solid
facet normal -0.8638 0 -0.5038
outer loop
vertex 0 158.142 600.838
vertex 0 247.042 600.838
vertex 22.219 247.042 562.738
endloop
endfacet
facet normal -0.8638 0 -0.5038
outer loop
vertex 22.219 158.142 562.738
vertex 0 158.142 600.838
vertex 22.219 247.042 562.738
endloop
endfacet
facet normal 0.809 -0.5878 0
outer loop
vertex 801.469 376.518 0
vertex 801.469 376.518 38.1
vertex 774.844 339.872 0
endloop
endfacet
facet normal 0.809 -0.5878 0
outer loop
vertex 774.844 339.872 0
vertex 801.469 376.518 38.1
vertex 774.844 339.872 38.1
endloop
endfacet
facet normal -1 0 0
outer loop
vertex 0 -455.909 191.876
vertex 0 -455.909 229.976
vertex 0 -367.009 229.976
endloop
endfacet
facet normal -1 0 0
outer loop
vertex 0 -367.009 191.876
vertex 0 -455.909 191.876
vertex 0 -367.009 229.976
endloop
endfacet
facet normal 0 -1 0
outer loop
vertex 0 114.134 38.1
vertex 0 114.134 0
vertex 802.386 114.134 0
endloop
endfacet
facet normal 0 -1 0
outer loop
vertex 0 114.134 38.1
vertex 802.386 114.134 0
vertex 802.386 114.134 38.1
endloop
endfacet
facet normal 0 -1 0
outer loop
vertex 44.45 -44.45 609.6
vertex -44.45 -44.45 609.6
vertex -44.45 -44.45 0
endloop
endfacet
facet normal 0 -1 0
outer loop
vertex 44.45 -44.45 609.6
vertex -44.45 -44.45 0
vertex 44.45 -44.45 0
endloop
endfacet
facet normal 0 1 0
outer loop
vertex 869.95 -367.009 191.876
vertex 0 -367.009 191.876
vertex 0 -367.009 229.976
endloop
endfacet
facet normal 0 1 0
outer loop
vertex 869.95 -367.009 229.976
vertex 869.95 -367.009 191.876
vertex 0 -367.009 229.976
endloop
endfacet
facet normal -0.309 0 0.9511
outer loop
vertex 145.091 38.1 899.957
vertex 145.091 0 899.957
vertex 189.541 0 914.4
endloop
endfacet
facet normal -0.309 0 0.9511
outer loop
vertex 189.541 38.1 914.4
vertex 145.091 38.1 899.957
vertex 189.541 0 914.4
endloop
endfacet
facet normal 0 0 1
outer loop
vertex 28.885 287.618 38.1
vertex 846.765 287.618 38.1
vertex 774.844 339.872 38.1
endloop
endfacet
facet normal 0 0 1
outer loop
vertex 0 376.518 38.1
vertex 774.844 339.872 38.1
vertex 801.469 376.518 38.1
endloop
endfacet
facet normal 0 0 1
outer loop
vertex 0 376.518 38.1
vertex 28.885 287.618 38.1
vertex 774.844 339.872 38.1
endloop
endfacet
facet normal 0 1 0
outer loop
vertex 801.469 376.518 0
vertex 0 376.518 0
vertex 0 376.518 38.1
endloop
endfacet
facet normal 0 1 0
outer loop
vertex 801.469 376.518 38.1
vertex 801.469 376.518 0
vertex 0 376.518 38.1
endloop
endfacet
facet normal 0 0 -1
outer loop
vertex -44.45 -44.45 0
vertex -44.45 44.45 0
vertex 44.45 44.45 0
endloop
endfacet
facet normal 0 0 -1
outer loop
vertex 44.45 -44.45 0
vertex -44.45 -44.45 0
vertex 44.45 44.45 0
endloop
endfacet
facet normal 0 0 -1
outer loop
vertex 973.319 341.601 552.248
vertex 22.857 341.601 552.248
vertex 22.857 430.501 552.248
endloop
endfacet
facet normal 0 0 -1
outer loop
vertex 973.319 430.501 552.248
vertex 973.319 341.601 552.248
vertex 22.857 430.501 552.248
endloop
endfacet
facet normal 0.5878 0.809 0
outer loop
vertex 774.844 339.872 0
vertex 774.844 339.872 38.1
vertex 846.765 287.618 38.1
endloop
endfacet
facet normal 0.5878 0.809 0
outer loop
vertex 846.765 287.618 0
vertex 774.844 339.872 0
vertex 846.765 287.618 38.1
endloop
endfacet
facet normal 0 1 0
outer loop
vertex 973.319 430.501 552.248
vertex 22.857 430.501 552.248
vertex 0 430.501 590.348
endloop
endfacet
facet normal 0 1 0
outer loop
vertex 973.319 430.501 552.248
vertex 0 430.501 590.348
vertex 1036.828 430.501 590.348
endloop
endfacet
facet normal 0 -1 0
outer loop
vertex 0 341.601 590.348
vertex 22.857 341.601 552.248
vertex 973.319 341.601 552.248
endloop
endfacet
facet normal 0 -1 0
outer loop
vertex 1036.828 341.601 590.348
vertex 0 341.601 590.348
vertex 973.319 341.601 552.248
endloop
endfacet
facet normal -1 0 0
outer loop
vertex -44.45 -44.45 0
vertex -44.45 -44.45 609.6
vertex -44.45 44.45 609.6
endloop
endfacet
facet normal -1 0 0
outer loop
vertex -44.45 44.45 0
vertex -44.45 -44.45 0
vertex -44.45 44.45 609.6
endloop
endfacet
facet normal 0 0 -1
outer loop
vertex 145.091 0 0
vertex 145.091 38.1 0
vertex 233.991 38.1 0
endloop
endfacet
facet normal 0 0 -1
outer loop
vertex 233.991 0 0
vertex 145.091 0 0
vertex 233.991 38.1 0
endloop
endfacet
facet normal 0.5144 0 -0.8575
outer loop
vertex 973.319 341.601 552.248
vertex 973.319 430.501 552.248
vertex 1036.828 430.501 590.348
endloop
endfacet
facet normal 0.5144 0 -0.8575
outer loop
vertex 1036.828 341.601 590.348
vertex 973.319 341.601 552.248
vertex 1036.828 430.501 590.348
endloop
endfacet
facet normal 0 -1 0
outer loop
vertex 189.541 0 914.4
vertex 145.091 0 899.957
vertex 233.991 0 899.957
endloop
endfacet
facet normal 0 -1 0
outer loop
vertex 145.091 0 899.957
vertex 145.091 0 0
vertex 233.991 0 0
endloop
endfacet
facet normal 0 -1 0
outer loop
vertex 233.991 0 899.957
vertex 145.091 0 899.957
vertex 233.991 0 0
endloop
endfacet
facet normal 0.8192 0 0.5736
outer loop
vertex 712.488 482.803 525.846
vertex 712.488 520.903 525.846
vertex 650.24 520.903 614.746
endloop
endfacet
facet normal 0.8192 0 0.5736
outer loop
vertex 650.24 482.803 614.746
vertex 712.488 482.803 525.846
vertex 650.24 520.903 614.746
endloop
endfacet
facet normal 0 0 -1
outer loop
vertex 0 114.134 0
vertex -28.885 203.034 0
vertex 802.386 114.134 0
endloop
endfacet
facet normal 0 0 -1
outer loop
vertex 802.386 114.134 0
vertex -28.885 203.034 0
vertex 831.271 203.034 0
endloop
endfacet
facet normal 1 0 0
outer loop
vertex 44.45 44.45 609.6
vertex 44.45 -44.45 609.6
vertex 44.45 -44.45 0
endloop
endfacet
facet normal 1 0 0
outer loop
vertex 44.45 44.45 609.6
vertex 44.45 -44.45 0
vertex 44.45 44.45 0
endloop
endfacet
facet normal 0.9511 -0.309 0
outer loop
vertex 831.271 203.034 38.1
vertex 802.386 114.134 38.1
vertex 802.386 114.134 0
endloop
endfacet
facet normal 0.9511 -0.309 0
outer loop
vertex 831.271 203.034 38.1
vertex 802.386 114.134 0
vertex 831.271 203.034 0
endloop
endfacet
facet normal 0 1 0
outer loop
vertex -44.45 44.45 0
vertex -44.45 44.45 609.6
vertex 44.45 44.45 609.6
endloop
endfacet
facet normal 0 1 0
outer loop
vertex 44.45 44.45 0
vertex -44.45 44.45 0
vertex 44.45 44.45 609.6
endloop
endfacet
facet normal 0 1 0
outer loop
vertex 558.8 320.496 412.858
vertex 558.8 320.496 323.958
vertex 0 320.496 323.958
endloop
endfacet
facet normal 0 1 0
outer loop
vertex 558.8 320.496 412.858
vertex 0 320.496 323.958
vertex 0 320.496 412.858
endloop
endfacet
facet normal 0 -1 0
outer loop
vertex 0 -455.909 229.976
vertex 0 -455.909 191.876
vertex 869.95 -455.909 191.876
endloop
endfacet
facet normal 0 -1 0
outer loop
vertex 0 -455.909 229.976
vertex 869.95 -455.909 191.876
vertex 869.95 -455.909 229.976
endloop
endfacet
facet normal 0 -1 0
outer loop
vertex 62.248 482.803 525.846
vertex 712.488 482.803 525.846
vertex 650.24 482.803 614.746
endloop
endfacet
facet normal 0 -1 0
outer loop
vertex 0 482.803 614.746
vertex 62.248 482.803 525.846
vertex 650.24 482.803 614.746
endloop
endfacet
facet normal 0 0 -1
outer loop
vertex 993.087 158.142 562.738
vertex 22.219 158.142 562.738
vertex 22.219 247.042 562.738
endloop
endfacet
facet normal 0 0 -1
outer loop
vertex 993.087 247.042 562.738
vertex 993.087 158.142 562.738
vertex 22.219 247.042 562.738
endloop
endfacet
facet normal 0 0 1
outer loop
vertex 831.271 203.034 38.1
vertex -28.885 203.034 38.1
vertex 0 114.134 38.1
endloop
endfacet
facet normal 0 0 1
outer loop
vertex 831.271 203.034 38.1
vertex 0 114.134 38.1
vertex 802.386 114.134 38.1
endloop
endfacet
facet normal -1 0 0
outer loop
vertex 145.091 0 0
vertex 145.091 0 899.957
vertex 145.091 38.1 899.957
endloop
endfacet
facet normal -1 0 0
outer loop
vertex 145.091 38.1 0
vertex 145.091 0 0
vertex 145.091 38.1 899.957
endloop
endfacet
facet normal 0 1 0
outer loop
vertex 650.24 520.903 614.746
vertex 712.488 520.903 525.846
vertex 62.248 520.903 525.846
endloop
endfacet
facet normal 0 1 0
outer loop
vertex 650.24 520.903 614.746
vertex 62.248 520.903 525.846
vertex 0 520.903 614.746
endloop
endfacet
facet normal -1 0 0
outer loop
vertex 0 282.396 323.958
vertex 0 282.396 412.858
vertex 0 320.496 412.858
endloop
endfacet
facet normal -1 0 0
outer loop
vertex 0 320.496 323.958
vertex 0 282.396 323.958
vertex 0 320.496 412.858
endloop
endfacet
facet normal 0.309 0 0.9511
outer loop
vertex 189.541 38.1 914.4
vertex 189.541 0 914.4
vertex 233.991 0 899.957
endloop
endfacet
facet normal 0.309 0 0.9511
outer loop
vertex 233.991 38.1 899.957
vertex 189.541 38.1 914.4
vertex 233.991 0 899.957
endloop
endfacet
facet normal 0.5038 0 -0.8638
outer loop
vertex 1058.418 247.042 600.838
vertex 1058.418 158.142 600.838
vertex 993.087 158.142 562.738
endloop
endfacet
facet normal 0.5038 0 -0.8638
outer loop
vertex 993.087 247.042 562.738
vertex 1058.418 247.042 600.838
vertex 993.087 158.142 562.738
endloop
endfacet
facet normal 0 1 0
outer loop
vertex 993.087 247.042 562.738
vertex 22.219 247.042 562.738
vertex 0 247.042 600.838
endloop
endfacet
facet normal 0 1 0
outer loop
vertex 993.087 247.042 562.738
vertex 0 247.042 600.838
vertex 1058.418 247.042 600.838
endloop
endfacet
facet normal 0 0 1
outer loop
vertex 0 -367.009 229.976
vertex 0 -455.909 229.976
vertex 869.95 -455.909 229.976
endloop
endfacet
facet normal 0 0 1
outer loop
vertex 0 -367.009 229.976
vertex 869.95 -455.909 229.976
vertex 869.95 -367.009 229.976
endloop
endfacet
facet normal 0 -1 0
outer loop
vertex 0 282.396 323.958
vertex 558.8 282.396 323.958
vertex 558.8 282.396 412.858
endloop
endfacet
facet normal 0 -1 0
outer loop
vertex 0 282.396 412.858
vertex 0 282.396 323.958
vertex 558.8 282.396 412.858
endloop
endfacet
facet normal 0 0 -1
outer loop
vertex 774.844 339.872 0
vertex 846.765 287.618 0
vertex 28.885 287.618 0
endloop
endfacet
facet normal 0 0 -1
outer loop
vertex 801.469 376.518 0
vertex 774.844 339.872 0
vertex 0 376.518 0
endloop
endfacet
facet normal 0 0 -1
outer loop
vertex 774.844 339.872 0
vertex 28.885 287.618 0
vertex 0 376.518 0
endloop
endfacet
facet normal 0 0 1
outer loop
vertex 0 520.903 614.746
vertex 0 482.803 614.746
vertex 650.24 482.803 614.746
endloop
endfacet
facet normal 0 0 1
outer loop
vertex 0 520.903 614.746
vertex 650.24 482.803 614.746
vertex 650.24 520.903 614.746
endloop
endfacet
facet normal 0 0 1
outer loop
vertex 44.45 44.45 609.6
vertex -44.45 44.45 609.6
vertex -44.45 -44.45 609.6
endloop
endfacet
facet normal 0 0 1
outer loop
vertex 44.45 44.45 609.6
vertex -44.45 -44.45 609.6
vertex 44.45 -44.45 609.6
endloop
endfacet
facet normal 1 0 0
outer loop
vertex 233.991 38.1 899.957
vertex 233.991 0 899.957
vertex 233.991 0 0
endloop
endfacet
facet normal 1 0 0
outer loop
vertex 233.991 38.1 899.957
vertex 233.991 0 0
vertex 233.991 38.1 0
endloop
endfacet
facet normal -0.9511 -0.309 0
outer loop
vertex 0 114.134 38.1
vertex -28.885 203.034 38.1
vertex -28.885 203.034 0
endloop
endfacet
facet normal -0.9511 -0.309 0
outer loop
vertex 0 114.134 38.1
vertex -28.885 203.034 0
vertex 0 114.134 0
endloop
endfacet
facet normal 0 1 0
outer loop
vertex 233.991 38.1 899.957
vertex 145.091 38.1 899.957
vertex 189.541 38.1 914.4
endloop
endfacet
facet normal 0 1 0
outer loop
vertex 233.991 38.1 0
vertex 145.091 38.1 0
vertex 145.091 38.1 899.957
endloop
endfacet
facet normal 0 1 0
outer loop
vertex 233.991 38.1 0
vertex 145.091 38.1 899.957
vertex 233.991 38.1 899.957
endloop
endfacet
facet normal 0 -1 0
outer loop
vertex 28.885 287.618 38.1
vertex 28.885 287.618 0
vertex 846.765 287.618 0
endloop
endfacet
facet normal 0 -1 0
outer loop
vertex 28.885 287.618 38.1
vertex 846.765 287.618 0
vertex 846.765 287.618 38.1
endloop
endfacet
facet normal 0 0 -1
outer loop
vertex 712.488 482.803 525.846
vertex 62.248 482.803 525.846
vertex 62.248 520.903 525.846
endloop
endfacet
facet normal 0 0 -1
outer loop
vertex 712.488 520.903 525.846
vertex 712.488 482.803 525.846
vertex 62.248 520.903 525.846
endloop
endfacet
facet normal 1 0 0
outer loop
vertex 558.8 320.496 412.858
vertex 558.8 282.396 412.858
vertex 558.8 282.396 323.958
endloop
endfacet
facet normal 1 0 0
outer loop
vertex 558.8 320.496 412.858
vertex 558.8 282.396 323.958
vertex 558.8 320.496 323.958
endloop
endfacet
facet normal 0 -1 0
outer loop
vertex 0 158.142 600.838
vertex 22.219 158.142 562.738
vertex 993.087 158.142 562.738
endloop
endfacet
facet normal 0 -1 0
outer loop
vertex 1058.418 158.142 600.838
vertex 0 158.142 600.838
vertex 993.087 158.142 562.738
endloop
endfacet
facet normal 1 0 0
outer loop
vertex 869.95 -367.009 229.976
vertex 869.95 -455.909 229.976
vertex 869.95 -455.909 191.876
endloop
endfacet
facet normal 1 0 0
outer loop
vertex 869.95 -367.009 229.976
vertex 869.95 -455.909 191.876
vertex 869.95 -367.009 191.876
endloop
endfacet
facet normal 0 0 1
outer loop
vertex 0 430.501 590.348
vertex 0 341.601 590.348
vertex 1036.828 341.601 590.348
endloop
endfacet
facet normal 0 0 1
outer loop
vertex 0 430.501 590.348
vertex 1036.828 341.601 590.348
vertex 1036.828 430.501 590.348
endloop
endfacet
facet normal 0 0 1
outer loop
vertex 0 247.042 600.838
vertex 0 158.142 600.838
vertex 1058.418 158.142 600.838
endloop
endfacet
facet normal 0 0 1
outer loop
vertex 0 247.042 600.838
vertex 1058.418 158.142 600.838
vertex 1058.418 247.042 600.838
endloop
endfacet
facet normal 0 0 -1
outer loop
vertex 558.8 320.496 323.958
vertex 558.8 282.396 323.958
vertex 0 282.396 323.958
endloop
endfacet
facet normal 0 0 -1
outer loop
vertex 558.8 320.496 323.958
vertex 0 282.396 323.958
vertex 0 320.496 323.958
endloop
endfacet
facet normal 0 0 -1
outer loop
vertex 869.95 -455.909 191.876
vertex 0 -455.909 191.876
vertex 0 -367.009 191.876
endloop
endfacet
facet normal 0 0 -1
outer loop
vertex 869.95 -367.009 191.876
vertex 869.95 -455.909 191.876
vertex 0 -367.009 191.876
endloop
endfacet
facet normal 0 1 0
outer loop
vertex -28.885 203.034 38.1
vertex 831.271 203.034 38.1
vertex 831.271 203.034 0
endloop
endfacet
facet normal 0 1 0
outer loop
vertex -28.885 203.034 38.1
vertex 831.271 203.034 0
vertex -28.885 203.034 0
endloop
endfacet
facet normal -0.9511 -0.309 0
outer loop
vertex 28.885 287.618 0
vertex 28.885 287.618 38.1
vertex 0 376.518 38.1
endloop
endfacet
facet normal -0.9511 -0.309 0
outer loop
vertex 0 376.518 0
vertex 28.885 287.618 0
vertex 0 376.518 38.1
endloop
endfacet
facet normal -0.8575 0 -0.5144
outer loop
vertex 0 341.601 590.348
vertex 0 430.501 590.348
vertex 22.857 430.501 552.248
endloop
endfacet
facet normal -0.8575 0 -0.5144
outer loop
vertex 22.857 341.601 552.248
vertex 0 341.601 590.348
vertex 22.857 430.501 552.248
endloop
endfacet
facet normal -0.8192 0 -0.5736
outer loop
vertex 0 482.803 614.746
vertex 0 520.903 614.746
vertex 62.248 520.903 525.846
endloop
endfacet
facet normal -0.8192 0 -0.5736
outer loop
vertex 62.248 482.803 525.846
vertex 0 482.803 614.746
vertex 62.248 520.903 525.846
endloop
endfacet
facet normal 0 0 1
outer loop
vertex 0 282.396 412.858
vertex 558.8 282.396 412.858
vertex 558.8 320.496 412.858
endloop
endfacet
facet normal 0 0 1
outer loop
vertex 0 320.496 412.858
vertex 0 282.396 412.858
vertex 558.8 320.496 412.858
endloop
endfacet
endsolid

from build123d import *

# Parameters (mm, degrees)
F0_W      = 88.9
F0_H      = 88.9
F1_DEPTH  = 609.6
F2_W      = 88.9
F2_H      = 38.1
F3_DEPTH  = 914.4
F5_DEPTH  = 44.451
F6_W      = 88.9
F6_H      = 38.1
F7_DEPTH  = 802.386
F9_DEPTH  = 38.1
F10_W     = 88.9
F10_H     = 38.1
F11_DEPTH = 1058.418
F13_DEPTH = 88.901
F15_DEPTH = 291.4930525193
F16_W     = 88.9
F16_H     = 38.1
F17_DEPTH = 869.95
F18_W     = 88.9
F18_H     = 38.1
F19_DEPTH = 1036.828
F21_DEPTH = 886.4102444897
F22_DEPTH = 886.4102444897
F23_W     = 88.9
F23_H     = 38.1
F24_DEPTH = 1066.8
F26_DEPTH = 38.101
F28_DEPTH = 38.101
F29_W     = 38.1
F29_H     = 88.9
F30_DEPTH = 558.8
F31_W     = 38.1
F31_H     = 88.9
F32_DEPTH = 762
F34_DEPTH = 976.812467675
F36_DEPTH = 976.812467675
F37_W     = 88.9
F37_H     = 38.1
F38_DEPTH = 508
F40_DEPTH = 38.101
F42_DEPTH = 38.101


with BuildPart() as f1:
    # F0 (on Top) → F1 (new body)
    with BuildSketch(Plane.XY):
        Rectangle(F0_W, F0_H)
    extrude(amount=F1_DEPTH)


with BuildPart() as f3:
    # F2 (on Top) → F3 (new body)
    with BuildSketch(Plane.XY):
        with Locations((189.5409819244, 19.05)):
            Rectangle(F2_W, F2_H)
    extrude(amount=F3_DEPTH)

    # F4 (on face) → F5 (cut, through all)
    with BuildSketch(Plane.XZ):
        Polygon((145.0909819244, 899.9573195024), (189.5409819244, 914.4), (145.0909819244, 914.4), align=None)
        Polygon((233.9909819244, 914.4), (189.5409819244, 914.4), (233.9909819244, 899.9573195024), align=None)
    extrude(amount=-F5_DEPTH, mode=Mode.SUBTRACT)


with BuildPart() as f7:
    # F6 (on Right) → F7 (new body)
    with BuildSketch(Plane.YZ):
        with Locations((158.5839751139, 19.05)):
            Rectangle(F6_W, F6_H)
    extrude(amount=F7_DEPTH)

    # F8 (on face) → F9 (join)
    with BuildSketch(Plane.XY.offset(38.1)):
        Polygon((-28.8853609951, 203.0339751139), (0, 114.1339751139), (0, 203.0339751139), align=None)
        Polygon((802.386, 203.0339751139), (802.386, 114.1339751139), (831.2713609951, 203.0339751139), align=None)
    extrude(amount=-F9_DEPTH)


with BuildPart() as f11:
    # F10 (on Right) → F11 (new body)
    with BuildSketch(Plane.YZ):
        with Locations((202.5920525193, 581.7884122946)):
            Rectangle(F10_W, F10_H)
    extrude(amount=F11_DEPTH)

    # F12 (on face) → F13 (cut, through all)
    with BuildSketch(Plane.XZ.offset(-158.1420525193)):
        Polygon((1058.418, 562.7384122946), (1058.418, 600.8384122946), (993.0868510167, 562.7384122946), align=None)
    extrude(amount=-F13_DEPTH, mode=Mode.SUBTRACT)

    # F14 (on face) → F15 (cut, through all)
    with BuildSketch(Plane(origin=(0, 247.0420525193, 0), x_dir=(-1, 0, 0), z_dir=(0, 1, 0))):
        Polygon((0, 562.7384122946), (0, 600.8384122946), (-22.2192632854, 562.7384122946), align=None)
    extrude(amount=-F15_DEPTH, mode=Mode.SUBTRACT)


with BuildPart() as f17:
    # F16 (on Right) → F17 (new body)
    with BuildSketch(Plane.YZ):
        with Locations((-411.4587221622, 210.9255347661)):
            Rectangle(F16_W, F16_H)
    extrude(amount=F17_DEPTH)


with BuildPart() as f19:
    # F18 (on Right) → F19 (new body)
    with BuildSketch(Plane.YZ):
        with Locations((386.0505223274, 571.2980129524)):
            Rectangle(F18_W, F18_H)
    extrude(amount=F19_DEPTH)

    # F20 (on face) → F21 (cut, through all)
    with BuildSketch(Plane(origin=(0, 430.5005223274, 0), x_dir=(-1, 0, 0), z_dir=(0, 1, 0))):
        Polygon((0, 552.2480129524), (0, 590.3480129524), (-22.856602877, 552.2480129524), align=None)
    extrude(amount=-F21_DEPTH, mode=Mode.SUBTRACT)

    # F20 (on face) → F22 (cut, through all)
    with BuildSketch(Plane(origin=(0, 430.5005223274, 0), x_dir=(-1, 0, 0), z_dir=(0, 1, 0))):
        Polygon((-973.3185621448, 552.2480129524), (-1036.828, 590.3480129524), (-1036.828, 552.2480129524), align=None)
    extrude(amount=-F22_DEPTH, mode=Mode.SUBTRACT)


with BuildPart() as f24:
    # F23 (on Right) → F24 (new body)
    with BuildSketch(Plane.YZ):
        with Locations((332.0678491998, 19.05)):
            Rectangle(F23_W, F23_H)
    extrude(amount=F24_DEPTH)

    # F25 (on face) → F26 (cut, through all)
    with BuildSketch(Plane.XY.offset(38.1)):
        Polygon((28.8853609951, 287.6178491998), (0, 376.5178491998), (0, 287.6178491998), align=None)
    extrude(amount=-F26_DEPTH, mode=Mode.SUBTRACT)

    # F27 (on face) → F28 (cut, through all)
    with BuildSketch(Plane.XY.offset(38.1)):
        Polygon((774.8437501952, 339.8719581286), (846.7653609951, 287.6178491998), (1066.8, 287.6178491998), (1066.8, 376.5178491998), (801.4685485351, 376.5178491998), align=None)
    extrude(amount=-F28_DEPTH, mode=Mode.SUBTRACT)


with BuildPart() as f30:
    # F29 (on Right) → F30 (new body)
    with BuildSketch(Plane.YZ):
        with Locations((301.4461100101, 368.408357701)):
            Rectangle(F29_W, F29_H)
    extrude(amount=F30_DEPTH)


with BuildPart() as f32:
    # F31 (on Right) → F32 (new body)
    with BuildSketch(Plane.YZ):
        with Locations((501.8527455127, 570.2958106995)):
            Rectangle(F31_W, F31_H)
    extrude(amount=F32_DEPTH)

    # F33 (on face) → F34 (cut, through all)
    with BuildSketch(Plane(origin=(0, 520.9027455127, 0), x_dir=(-1, 0, 0), z_dir=(0, 1, 0))):
        Polygon((0, 525.8458106995), (0, 614.7458106995), (-62.2484501468, 525.8458106995), align=None)
    extrude(amount=-F34_DEPTH, mode=Mode.SUBTRACT)

    # F35 (on face) → F36 (cut, through all)
    with BuildSketch(Plane(origin=(0, 520.9027455127, 0), x_dir=(-1, 0, 0), z_dir=(0, 1, 0))):
        Polygon((-762, 525.8458106995), (-712.4884501468, 525.8458106995), (-650.24, 614.7458106995), (-762, 614.7458106995), align=None)
    extrude(amount=-F36_DEPTH, mode=Mode.SUBTRACT)


with BuildPart() as f38:
    # F37 (on face) → F38 (new body)
    with BuildSketch(Plane(origin=(110.6558194923, 35.9542552558, 0), x_dir=(0.3090169944, -0.9510565163, 0), z_dir=(-0.9510565163, -0.3090169944, 0))):
        with Locations((-1037.2092051929, 19.05)):
            Rectangle(F37_W, F37_H)
    extrude(amount=F38_DEPTH)

    # F39 (on face) → F40 (cut, through all)
    with BuildSketch(Plane.XY.offset(38.1)):
        Polygon((-630.4460123089, 839.0044752145), (-706.7319673124, 907.6926576227), (-679.2603565124, 823.1437333241), align=None)
    extrude(amount=-F40_DEPTH, mode=Mode.SUBTRACT)

    # F41 (on face) → F42 (cut, through all)
    with BuildSketch(Plane.XY.offset(38.1)):
        Polygon((-196.1236462345, 980.1243664665), (-223.5952570344, 1064.6732907652), (-244.937990438, 964.2636245761), align=None)
    extrude(amount=-F42_DEPTH, mode=Mode.SUBTRACT)


solid = Compound([f1.part, f3.part, f7.part, f11.part, f17.part, f19.part, f24.part, f30.part, f32.part])
